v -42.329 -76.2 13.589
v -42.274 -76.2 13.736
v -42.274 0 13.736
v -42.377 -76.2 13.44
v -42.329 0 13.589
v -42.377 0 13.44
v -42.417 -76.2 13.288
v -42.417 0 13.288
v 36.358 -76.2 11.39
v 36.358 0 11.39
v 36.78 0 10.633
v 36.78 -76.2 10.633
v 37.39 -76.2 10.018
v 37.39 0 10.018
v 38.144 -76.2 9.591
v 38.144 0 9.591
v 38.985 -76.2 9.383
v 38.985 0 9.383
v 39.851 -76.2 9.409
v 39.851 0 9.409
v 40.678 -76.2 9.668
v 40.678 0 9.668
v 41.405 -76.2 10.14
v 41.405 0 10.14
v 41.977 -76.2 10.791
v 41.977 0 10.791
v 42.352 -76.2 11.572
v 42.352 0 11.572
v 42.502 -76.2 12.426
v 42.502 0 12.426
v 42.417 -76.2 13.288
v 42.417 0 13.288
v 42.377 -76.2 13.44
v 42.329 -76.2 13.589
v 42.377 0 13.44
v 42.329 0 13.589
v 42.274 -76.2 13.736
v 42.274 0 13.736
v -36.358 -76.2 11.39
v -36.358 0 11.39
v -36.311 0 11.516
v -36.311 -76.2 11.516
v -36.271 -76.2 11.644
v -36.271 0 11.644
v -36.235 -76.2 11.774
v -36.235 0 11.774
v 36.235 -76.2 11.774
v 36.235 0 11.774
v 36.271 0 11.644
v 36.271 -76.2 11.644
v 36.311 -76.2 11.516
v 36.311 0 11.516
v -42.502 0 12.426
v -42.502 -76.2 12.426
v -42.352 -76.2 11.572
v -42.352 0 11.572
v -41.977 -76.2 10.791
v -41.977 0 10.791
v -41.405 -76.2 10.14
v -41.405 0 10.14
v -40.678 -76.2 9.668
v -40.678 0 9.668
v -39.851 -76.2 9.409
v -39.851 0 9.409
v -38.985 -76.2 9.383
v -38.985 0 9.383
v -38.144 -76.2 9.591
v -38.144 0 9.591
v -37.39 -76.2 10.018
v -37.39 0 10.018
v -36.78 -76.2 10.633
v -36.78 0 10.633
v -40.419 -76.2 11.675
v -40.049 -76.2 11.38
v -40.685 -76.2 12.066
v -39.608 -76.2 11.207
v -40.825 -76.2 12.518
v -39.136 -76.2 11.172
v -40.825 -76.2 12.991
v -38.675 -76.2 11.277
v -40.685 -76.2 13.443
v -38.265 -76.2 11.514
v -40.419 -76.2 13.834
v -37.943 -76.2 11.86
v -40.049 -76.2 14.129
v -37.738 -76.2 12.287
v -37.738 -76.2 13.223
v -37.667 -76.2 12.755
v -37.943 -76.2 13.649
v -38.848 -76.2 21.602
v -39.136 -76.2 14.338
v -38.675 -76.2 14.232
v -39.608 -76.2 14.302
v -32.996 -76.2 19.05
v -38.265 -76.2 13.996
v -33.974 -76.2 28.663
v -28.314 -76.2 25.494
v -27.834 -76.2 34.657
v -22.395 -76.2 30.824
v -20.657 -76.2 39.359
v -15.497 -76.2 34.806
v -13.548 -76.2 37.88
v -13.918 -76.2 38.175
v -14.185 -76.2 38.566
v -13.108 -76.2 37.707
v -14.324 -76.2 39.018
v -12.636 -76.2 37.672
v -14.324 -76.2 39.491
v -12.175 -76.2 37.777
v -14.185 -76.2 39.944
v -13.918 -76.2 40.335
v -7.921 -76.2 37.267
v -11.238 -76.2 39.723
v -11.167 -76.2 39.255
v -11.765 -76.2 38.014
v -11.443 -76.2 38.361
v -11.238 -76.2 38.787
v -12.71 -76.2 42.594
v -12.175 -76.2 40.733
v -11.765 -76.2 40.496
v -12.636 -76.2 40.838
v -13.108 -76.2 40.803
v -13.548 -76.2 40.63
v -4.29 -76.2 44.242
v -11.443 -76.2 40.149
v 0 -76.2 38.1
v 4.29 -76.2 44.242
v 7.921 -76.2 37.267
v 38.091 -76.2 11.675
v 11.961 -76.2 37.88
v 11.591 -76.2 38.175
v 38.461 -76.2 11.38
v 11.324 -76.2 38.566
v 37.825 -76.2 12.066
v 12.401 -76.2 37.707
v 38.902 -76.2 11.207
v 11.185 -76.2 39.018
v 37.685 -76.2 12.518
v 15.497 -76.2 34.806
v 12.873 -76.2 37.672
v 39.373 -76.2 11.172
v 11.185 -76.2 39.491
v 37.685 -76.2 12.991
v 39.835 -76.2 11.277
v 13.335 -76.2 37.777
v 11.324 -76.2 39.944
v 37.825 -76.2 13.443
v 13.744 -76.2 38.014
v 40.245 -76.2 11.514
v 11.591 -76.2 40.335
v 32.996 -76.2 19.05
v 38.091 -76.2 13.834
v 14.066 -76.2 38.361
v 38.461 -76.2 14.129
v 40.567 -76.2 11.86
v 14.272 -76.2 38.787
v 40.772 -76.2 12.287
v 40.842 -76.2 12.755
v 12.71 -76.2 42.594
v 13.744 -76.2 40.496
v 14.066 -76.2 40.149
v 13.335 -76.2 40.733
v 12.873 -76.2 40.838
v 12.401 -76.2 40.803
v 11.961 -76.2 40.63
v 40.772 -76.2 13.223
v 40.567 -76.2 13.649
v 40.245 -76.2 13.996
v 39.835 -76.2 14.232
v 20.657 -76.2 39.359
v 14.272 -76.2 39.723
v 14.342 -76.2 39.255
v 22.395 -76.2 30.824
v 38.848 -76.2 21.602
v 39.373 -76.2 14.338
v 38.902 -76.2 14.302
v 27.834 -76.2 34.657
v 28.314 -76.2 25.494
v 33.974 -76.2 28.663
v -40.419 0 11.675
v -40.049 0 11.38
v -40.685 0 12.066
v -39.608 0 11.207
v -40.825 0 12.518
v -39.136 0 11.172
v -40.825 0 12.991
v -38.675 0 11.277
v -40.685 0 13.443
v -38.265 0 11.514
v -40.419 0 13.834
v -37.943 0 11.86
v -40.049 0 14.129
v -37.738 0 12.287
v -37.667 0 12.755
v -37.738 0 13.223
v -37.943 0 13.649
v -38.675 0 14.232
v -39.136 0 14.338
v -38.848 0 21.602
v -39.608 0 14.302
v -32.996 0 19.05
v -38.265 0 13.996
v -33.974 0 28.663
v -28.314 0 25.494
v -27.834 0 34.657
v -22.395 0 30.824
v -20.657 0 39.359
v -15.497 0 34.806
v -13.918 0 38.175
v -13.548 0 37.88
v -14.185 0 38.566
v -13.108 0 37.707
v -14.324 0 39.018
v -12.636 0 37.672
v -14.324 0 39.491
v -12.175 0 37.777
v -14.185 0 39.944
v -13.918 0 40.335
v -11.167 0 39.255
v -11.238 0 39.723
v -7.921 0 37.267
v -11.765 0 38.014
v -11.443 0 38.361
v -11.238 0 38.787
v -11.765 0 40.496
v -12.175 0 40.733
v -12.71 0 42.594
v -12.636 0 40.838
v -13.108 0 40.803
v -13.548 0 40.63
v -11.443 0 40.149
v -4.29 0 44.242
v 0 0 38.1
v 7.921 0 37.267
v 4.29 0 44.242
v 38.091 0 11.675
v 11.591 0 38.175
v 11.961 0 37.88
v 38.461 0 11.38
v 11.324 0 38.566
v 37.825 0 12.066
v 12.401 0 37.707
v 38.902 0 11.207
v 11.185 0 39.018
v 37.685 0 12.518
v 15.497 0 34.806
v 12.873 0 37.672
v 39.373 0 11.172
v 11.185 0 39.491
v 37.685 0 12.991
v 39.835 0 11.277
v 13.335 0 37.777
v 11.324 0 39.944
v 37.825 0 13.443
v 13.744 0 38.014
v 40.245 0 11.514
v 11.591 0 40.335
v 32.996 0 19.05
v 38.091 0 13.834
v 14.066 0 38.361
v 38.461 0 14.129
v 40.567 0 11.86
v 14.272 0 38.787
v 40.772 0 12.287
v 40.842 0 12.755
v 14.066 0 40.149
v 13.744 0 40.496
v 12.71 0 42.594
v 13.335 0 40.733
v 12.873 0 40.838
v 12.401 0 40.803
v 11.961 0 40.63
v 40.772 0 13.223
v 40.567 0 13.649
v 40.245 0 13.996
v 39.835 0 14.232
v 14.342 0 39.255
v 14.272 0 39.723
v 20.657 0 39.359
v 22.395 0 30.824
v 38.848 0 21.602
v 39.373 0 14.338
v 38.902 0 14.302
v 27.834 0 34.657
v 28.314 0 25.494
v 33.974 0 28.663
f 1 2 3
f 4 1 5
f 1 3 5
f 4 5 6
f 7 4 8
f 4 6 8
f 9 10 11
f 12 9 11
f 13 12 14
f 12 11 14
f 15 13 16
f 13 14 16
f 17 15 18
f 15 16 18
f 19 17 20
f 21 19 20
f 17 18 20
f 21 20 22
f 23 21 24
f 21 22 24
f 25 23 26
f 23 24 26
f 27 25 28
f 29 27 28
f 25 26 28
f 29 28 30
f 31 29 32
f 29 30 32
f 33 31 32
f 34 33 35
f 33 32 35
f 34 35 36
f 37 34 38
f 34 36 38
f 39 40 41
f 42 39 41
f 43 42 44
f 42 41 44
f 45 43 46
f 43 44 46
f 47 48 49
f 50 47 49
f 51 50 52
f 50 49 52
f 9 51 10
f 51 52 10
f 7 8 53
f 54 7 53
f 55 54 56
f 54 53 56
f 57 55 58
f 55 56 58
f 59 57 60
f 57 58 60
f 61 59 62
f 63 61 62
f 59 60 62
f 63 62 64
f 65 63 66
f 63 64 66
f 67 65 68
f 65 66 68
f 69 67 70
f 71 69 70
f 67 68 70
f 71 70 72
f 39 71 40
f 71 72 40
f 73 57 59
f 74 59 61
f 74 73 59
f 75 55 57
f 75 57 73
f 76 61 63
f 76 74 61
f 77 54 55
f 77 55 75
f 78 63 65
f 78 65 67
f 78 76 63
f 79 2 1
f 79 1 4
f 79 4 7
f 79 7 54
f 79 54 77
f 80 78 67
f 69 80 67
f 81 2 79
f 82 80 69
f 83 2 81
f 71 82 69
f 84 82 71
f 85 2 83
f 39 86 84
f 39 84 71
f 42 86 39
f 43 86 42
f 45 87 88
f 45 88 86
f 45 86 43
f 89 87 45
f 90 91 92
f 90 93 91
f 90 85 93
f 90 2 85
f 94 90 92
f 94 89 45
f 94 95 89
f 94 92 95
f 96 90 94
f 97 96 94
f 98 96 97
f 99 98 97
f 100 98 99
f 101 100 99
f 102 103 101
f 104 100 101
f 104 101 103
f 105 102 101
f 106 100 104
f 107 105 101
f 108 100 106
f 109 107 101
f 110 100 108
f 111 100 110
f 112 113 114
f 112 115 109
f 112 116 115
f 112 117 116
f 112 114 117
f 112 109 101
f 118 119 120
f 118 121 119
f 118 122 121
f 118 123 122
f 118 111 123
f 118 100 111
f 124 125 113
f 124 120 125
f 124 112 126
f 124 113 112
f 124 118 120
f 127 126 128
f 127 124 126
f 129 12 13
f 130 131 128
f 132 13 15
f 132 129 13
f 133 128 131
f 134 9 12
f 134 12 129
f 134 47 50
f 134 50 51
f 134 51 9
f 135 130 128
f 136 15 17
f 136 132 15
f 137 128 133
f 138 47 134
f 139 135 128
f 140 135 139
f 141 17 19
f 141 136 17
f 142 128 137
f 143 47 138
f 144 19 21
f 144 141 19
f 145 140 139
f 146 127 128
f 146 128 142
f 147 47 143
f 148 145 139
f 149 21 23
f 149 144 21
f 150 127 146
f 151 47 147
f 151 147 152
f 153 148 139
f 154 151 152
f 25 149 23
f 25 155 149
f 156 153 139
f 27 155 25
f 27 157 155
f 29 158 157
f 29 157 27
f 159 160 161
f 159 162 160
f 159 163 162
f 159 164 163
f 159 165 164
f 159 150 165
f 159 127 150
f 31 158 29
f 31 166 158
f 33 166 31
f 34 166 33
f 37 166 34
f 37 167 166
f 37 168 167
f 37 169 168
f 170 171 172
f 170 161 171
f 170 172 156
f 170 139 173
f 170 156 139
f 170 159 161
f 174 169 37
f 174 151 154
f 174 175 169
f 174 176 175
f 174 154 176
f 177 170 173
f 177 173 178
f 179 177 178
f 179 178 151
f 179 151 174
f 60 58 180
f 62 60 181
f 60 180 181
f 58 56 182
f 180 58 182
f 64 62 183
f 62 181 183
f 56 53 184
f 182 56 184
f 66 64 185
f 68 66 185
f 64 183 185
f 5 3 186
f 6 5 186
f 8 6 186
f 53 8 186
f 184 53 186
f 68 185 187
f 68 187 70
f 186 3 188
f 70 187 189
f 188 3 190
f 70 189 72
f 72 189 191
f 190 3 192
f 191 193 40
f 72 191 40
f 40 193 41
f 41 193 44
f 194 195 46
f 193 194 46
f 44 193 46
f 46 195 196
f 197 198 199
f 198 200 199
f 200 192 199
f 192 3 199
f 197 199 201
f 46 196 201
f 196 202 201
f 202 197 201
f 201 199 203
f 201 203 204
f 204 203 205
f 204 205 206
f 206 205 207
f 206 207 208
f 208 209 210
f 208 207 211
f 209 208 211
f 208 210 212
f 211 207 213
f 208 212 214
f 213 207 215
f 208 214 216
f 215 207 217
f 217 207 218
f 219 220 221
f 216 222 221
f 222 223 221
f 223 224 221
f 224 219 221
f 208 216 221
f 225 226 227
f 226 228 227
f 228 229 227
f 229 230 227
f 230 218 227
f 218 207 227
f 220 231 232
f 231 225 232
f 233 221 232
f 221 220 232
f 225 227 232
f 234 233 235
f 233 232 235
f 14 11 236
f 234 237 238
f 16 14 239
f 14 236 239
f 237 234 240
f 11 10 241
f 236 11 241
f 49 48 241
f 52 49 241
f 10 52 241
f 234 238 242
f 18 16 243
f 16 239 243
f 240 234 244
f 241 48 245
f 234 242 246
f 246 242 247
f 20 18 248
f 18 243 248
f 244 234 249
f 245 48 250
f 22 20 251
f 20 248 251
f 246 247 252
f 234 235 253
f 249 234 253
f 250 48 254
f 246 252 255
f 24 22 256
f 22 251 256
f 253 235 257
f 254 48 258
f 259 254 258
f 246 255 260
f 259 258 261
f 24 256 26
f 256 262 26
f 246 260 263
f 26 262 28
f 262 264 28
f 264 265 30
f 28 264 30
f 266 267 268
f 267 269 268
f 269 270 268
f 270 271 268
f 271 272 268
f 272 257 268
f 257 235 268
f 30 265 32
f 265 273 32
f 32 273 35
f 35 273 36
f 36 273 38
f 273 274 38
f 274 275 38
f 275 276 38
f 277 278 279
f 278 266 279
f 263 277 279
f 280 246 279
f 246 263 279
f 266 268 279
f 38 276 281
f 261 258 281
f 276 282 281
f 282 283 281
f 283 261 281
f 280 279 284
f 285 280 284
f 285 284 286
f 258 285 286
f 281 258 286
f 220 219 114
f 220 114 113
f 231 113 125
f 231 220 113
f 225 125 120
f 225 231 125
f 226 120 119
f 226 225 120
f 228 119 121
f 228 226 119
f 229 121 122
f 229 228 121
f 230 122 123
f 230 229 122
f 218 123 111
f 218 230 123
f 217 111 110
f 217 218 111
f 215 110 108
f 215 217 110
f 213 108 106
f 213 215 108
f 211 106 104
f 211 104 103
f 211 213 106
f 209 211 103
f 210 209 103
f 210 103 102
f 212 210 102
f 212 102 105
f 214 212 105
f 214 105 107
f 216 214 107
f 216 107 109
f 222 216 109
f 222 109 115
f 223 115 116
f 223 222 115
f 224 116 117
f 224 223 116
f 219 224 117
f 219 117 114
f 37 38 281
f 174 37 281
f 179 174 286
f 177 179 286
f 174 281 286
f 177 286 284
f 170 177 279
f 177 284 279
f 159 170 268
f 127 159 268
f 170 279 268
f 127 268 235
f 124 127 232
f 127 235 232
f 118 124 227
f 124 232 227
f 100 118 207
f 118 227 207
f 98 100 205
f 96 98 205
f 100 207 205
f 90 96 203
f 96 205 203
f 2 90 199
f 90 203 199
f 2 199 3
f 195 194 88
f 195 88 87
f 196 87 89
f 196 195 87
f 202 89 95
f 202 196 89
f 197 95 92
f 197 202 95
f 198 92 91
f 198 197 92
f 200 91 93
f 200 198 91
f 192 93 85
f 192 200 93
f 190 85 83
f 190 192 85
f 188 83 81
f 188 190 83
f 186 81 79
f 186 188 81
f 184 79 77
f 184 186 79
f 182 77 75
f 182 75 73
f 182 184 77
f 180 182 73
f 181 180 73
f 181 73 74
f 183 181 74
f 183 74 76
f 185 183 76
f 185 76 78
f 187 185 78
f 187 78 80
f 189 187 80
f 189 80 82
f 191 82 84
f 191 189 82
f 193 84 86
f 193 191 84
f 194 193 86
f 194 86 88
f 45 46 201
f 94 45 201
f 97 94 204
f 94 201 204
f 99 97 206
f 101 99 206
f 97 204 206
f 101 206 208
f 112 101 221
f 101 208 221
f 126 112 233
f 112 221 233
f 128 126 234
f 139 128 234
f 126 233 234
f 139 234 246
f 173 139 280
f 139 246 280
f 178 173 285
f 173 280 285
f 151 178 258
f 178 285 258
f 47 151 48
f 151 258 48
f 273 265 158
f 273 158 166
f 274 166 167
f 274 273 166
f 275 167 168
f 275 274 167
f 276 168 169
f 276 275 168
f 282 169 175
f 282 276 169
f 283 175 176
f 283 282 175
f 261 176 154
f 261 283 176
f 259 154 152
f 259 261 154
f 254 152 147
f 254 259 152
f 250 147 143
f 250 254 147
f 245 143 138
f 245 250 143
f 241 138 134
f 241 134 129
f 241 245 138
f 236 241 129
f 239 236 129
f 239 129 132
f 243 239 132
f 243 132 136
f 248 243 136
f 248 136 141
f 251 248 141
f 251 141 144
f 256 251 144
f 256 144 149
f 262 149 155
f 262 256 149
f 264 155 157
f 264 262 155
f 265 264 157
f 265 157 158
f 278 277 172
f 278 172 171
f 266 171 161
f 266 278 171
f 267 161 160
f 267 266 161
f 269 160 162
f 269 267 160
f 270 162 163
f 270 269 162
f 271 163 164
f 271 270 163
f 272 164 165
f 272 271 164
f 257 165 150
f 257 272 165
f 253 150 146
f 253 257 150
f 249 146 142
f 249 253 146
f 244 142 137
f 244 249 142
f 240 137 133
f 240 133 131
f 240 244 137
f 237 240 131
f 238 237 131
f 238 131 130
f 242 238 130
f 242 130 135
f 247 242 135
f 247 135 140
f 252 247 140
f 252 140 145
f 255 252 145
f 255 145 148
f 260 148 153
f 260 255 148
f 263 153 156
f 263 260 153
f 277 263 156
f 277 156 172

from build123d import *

# Parameters (mm, degrees)
F0_R     = 1.5875
F1_DEPTH = 76.2


with BuildPart() as f1:
    # F0 (on Front) → F1 (new body)
    with BuildSketch(Plane.XZ):
        with BuildLine():
            ThreePointArc((36.357702, 11.389799), (40.273671, 9.510209), (42.417319, 13.288099))
            ThreePointArc((42.417319, 13.288099), (42.346482, 13.512141), (42.274462, 13.735805))
            ThreePointArc((42.274462, 13.735805), (0, 44.45), (-42.274462, 13.735805))
            ThreePointArc((-42.274462, 13.735805), (-42.346482, 13.512141), (-42.417319, 13.288099))
            ThreePointArc((-42.417319, 13.288099), (-40.273671, 9.510209), (-36.357702, 11.389799))
            ThreePointArc((-36.357702, 11.389799), (-36.296985, 11.581835), (-36.235253, 11.773547))
            ThreePointArc((-36.235253, 11.773547), (0, 38.1), (36.235253, 11.773547))
            ThreePointArc((36.235253, 11.773547), (36.296985, 11.581835), (36.357702, 11.389799))
        make_face()
        with Locations((-39.254858, 12.754676)):
            Circle(F0_R, mode=Mode.SUBTRACT)
        with Locations((39.254858, 12.754676)):
            Circle(F0_R, mode=Mode.SUBTRACT)
        with Locations((-12.754676, 39.254858)):
            Circle(F0_R, mode=Mode.SUBTRACT)
        with Locations((12.754676, 39.254858)):
            Circle(F0_R, mode=Mode.SUBTRACT)
        with BuildLine():
            ThreePointArc((42.274462, 13.735805), (42.346482, 13.512141), (42.417319, 13.288099))
            ThreePointArc((42.417319, 13.288099), (42.354166, 13.514593), (42.274462, 13.735805))
        make_face()
        with BuildLine():
            ThreePointArc((36.235253, 11.773547), (36.2904, 11.579734), (36.357702, 11.389799))
            ThreePointArc((36.357702, 11.389799), (36.296985, 11.581835), (36.235253, 11.773547))
        make_face()
        with BuildLine():
            ThreePointArc((-42.417319, 13.288099), (-42.346482, 13.512141), (-42.274462, 13.735805))
            ThreePointArc((-42.274462, 13.735805), (-42.354166, 13.514593), (-42.417319, 13.288099))
        make_face()
        with BuildLine():
            ThreePointArc((-36.357702, 11.389799), (-36.2904, 11.579734), (-36.235253, 11.773547))
            ThreePointArc((-36.235253, 11.773547), (-36.296985, 11.581835), (-36.357702, 11.389799))
        make_face()
    extrude(amount=F1_DEPTH)


solid = f1.part
